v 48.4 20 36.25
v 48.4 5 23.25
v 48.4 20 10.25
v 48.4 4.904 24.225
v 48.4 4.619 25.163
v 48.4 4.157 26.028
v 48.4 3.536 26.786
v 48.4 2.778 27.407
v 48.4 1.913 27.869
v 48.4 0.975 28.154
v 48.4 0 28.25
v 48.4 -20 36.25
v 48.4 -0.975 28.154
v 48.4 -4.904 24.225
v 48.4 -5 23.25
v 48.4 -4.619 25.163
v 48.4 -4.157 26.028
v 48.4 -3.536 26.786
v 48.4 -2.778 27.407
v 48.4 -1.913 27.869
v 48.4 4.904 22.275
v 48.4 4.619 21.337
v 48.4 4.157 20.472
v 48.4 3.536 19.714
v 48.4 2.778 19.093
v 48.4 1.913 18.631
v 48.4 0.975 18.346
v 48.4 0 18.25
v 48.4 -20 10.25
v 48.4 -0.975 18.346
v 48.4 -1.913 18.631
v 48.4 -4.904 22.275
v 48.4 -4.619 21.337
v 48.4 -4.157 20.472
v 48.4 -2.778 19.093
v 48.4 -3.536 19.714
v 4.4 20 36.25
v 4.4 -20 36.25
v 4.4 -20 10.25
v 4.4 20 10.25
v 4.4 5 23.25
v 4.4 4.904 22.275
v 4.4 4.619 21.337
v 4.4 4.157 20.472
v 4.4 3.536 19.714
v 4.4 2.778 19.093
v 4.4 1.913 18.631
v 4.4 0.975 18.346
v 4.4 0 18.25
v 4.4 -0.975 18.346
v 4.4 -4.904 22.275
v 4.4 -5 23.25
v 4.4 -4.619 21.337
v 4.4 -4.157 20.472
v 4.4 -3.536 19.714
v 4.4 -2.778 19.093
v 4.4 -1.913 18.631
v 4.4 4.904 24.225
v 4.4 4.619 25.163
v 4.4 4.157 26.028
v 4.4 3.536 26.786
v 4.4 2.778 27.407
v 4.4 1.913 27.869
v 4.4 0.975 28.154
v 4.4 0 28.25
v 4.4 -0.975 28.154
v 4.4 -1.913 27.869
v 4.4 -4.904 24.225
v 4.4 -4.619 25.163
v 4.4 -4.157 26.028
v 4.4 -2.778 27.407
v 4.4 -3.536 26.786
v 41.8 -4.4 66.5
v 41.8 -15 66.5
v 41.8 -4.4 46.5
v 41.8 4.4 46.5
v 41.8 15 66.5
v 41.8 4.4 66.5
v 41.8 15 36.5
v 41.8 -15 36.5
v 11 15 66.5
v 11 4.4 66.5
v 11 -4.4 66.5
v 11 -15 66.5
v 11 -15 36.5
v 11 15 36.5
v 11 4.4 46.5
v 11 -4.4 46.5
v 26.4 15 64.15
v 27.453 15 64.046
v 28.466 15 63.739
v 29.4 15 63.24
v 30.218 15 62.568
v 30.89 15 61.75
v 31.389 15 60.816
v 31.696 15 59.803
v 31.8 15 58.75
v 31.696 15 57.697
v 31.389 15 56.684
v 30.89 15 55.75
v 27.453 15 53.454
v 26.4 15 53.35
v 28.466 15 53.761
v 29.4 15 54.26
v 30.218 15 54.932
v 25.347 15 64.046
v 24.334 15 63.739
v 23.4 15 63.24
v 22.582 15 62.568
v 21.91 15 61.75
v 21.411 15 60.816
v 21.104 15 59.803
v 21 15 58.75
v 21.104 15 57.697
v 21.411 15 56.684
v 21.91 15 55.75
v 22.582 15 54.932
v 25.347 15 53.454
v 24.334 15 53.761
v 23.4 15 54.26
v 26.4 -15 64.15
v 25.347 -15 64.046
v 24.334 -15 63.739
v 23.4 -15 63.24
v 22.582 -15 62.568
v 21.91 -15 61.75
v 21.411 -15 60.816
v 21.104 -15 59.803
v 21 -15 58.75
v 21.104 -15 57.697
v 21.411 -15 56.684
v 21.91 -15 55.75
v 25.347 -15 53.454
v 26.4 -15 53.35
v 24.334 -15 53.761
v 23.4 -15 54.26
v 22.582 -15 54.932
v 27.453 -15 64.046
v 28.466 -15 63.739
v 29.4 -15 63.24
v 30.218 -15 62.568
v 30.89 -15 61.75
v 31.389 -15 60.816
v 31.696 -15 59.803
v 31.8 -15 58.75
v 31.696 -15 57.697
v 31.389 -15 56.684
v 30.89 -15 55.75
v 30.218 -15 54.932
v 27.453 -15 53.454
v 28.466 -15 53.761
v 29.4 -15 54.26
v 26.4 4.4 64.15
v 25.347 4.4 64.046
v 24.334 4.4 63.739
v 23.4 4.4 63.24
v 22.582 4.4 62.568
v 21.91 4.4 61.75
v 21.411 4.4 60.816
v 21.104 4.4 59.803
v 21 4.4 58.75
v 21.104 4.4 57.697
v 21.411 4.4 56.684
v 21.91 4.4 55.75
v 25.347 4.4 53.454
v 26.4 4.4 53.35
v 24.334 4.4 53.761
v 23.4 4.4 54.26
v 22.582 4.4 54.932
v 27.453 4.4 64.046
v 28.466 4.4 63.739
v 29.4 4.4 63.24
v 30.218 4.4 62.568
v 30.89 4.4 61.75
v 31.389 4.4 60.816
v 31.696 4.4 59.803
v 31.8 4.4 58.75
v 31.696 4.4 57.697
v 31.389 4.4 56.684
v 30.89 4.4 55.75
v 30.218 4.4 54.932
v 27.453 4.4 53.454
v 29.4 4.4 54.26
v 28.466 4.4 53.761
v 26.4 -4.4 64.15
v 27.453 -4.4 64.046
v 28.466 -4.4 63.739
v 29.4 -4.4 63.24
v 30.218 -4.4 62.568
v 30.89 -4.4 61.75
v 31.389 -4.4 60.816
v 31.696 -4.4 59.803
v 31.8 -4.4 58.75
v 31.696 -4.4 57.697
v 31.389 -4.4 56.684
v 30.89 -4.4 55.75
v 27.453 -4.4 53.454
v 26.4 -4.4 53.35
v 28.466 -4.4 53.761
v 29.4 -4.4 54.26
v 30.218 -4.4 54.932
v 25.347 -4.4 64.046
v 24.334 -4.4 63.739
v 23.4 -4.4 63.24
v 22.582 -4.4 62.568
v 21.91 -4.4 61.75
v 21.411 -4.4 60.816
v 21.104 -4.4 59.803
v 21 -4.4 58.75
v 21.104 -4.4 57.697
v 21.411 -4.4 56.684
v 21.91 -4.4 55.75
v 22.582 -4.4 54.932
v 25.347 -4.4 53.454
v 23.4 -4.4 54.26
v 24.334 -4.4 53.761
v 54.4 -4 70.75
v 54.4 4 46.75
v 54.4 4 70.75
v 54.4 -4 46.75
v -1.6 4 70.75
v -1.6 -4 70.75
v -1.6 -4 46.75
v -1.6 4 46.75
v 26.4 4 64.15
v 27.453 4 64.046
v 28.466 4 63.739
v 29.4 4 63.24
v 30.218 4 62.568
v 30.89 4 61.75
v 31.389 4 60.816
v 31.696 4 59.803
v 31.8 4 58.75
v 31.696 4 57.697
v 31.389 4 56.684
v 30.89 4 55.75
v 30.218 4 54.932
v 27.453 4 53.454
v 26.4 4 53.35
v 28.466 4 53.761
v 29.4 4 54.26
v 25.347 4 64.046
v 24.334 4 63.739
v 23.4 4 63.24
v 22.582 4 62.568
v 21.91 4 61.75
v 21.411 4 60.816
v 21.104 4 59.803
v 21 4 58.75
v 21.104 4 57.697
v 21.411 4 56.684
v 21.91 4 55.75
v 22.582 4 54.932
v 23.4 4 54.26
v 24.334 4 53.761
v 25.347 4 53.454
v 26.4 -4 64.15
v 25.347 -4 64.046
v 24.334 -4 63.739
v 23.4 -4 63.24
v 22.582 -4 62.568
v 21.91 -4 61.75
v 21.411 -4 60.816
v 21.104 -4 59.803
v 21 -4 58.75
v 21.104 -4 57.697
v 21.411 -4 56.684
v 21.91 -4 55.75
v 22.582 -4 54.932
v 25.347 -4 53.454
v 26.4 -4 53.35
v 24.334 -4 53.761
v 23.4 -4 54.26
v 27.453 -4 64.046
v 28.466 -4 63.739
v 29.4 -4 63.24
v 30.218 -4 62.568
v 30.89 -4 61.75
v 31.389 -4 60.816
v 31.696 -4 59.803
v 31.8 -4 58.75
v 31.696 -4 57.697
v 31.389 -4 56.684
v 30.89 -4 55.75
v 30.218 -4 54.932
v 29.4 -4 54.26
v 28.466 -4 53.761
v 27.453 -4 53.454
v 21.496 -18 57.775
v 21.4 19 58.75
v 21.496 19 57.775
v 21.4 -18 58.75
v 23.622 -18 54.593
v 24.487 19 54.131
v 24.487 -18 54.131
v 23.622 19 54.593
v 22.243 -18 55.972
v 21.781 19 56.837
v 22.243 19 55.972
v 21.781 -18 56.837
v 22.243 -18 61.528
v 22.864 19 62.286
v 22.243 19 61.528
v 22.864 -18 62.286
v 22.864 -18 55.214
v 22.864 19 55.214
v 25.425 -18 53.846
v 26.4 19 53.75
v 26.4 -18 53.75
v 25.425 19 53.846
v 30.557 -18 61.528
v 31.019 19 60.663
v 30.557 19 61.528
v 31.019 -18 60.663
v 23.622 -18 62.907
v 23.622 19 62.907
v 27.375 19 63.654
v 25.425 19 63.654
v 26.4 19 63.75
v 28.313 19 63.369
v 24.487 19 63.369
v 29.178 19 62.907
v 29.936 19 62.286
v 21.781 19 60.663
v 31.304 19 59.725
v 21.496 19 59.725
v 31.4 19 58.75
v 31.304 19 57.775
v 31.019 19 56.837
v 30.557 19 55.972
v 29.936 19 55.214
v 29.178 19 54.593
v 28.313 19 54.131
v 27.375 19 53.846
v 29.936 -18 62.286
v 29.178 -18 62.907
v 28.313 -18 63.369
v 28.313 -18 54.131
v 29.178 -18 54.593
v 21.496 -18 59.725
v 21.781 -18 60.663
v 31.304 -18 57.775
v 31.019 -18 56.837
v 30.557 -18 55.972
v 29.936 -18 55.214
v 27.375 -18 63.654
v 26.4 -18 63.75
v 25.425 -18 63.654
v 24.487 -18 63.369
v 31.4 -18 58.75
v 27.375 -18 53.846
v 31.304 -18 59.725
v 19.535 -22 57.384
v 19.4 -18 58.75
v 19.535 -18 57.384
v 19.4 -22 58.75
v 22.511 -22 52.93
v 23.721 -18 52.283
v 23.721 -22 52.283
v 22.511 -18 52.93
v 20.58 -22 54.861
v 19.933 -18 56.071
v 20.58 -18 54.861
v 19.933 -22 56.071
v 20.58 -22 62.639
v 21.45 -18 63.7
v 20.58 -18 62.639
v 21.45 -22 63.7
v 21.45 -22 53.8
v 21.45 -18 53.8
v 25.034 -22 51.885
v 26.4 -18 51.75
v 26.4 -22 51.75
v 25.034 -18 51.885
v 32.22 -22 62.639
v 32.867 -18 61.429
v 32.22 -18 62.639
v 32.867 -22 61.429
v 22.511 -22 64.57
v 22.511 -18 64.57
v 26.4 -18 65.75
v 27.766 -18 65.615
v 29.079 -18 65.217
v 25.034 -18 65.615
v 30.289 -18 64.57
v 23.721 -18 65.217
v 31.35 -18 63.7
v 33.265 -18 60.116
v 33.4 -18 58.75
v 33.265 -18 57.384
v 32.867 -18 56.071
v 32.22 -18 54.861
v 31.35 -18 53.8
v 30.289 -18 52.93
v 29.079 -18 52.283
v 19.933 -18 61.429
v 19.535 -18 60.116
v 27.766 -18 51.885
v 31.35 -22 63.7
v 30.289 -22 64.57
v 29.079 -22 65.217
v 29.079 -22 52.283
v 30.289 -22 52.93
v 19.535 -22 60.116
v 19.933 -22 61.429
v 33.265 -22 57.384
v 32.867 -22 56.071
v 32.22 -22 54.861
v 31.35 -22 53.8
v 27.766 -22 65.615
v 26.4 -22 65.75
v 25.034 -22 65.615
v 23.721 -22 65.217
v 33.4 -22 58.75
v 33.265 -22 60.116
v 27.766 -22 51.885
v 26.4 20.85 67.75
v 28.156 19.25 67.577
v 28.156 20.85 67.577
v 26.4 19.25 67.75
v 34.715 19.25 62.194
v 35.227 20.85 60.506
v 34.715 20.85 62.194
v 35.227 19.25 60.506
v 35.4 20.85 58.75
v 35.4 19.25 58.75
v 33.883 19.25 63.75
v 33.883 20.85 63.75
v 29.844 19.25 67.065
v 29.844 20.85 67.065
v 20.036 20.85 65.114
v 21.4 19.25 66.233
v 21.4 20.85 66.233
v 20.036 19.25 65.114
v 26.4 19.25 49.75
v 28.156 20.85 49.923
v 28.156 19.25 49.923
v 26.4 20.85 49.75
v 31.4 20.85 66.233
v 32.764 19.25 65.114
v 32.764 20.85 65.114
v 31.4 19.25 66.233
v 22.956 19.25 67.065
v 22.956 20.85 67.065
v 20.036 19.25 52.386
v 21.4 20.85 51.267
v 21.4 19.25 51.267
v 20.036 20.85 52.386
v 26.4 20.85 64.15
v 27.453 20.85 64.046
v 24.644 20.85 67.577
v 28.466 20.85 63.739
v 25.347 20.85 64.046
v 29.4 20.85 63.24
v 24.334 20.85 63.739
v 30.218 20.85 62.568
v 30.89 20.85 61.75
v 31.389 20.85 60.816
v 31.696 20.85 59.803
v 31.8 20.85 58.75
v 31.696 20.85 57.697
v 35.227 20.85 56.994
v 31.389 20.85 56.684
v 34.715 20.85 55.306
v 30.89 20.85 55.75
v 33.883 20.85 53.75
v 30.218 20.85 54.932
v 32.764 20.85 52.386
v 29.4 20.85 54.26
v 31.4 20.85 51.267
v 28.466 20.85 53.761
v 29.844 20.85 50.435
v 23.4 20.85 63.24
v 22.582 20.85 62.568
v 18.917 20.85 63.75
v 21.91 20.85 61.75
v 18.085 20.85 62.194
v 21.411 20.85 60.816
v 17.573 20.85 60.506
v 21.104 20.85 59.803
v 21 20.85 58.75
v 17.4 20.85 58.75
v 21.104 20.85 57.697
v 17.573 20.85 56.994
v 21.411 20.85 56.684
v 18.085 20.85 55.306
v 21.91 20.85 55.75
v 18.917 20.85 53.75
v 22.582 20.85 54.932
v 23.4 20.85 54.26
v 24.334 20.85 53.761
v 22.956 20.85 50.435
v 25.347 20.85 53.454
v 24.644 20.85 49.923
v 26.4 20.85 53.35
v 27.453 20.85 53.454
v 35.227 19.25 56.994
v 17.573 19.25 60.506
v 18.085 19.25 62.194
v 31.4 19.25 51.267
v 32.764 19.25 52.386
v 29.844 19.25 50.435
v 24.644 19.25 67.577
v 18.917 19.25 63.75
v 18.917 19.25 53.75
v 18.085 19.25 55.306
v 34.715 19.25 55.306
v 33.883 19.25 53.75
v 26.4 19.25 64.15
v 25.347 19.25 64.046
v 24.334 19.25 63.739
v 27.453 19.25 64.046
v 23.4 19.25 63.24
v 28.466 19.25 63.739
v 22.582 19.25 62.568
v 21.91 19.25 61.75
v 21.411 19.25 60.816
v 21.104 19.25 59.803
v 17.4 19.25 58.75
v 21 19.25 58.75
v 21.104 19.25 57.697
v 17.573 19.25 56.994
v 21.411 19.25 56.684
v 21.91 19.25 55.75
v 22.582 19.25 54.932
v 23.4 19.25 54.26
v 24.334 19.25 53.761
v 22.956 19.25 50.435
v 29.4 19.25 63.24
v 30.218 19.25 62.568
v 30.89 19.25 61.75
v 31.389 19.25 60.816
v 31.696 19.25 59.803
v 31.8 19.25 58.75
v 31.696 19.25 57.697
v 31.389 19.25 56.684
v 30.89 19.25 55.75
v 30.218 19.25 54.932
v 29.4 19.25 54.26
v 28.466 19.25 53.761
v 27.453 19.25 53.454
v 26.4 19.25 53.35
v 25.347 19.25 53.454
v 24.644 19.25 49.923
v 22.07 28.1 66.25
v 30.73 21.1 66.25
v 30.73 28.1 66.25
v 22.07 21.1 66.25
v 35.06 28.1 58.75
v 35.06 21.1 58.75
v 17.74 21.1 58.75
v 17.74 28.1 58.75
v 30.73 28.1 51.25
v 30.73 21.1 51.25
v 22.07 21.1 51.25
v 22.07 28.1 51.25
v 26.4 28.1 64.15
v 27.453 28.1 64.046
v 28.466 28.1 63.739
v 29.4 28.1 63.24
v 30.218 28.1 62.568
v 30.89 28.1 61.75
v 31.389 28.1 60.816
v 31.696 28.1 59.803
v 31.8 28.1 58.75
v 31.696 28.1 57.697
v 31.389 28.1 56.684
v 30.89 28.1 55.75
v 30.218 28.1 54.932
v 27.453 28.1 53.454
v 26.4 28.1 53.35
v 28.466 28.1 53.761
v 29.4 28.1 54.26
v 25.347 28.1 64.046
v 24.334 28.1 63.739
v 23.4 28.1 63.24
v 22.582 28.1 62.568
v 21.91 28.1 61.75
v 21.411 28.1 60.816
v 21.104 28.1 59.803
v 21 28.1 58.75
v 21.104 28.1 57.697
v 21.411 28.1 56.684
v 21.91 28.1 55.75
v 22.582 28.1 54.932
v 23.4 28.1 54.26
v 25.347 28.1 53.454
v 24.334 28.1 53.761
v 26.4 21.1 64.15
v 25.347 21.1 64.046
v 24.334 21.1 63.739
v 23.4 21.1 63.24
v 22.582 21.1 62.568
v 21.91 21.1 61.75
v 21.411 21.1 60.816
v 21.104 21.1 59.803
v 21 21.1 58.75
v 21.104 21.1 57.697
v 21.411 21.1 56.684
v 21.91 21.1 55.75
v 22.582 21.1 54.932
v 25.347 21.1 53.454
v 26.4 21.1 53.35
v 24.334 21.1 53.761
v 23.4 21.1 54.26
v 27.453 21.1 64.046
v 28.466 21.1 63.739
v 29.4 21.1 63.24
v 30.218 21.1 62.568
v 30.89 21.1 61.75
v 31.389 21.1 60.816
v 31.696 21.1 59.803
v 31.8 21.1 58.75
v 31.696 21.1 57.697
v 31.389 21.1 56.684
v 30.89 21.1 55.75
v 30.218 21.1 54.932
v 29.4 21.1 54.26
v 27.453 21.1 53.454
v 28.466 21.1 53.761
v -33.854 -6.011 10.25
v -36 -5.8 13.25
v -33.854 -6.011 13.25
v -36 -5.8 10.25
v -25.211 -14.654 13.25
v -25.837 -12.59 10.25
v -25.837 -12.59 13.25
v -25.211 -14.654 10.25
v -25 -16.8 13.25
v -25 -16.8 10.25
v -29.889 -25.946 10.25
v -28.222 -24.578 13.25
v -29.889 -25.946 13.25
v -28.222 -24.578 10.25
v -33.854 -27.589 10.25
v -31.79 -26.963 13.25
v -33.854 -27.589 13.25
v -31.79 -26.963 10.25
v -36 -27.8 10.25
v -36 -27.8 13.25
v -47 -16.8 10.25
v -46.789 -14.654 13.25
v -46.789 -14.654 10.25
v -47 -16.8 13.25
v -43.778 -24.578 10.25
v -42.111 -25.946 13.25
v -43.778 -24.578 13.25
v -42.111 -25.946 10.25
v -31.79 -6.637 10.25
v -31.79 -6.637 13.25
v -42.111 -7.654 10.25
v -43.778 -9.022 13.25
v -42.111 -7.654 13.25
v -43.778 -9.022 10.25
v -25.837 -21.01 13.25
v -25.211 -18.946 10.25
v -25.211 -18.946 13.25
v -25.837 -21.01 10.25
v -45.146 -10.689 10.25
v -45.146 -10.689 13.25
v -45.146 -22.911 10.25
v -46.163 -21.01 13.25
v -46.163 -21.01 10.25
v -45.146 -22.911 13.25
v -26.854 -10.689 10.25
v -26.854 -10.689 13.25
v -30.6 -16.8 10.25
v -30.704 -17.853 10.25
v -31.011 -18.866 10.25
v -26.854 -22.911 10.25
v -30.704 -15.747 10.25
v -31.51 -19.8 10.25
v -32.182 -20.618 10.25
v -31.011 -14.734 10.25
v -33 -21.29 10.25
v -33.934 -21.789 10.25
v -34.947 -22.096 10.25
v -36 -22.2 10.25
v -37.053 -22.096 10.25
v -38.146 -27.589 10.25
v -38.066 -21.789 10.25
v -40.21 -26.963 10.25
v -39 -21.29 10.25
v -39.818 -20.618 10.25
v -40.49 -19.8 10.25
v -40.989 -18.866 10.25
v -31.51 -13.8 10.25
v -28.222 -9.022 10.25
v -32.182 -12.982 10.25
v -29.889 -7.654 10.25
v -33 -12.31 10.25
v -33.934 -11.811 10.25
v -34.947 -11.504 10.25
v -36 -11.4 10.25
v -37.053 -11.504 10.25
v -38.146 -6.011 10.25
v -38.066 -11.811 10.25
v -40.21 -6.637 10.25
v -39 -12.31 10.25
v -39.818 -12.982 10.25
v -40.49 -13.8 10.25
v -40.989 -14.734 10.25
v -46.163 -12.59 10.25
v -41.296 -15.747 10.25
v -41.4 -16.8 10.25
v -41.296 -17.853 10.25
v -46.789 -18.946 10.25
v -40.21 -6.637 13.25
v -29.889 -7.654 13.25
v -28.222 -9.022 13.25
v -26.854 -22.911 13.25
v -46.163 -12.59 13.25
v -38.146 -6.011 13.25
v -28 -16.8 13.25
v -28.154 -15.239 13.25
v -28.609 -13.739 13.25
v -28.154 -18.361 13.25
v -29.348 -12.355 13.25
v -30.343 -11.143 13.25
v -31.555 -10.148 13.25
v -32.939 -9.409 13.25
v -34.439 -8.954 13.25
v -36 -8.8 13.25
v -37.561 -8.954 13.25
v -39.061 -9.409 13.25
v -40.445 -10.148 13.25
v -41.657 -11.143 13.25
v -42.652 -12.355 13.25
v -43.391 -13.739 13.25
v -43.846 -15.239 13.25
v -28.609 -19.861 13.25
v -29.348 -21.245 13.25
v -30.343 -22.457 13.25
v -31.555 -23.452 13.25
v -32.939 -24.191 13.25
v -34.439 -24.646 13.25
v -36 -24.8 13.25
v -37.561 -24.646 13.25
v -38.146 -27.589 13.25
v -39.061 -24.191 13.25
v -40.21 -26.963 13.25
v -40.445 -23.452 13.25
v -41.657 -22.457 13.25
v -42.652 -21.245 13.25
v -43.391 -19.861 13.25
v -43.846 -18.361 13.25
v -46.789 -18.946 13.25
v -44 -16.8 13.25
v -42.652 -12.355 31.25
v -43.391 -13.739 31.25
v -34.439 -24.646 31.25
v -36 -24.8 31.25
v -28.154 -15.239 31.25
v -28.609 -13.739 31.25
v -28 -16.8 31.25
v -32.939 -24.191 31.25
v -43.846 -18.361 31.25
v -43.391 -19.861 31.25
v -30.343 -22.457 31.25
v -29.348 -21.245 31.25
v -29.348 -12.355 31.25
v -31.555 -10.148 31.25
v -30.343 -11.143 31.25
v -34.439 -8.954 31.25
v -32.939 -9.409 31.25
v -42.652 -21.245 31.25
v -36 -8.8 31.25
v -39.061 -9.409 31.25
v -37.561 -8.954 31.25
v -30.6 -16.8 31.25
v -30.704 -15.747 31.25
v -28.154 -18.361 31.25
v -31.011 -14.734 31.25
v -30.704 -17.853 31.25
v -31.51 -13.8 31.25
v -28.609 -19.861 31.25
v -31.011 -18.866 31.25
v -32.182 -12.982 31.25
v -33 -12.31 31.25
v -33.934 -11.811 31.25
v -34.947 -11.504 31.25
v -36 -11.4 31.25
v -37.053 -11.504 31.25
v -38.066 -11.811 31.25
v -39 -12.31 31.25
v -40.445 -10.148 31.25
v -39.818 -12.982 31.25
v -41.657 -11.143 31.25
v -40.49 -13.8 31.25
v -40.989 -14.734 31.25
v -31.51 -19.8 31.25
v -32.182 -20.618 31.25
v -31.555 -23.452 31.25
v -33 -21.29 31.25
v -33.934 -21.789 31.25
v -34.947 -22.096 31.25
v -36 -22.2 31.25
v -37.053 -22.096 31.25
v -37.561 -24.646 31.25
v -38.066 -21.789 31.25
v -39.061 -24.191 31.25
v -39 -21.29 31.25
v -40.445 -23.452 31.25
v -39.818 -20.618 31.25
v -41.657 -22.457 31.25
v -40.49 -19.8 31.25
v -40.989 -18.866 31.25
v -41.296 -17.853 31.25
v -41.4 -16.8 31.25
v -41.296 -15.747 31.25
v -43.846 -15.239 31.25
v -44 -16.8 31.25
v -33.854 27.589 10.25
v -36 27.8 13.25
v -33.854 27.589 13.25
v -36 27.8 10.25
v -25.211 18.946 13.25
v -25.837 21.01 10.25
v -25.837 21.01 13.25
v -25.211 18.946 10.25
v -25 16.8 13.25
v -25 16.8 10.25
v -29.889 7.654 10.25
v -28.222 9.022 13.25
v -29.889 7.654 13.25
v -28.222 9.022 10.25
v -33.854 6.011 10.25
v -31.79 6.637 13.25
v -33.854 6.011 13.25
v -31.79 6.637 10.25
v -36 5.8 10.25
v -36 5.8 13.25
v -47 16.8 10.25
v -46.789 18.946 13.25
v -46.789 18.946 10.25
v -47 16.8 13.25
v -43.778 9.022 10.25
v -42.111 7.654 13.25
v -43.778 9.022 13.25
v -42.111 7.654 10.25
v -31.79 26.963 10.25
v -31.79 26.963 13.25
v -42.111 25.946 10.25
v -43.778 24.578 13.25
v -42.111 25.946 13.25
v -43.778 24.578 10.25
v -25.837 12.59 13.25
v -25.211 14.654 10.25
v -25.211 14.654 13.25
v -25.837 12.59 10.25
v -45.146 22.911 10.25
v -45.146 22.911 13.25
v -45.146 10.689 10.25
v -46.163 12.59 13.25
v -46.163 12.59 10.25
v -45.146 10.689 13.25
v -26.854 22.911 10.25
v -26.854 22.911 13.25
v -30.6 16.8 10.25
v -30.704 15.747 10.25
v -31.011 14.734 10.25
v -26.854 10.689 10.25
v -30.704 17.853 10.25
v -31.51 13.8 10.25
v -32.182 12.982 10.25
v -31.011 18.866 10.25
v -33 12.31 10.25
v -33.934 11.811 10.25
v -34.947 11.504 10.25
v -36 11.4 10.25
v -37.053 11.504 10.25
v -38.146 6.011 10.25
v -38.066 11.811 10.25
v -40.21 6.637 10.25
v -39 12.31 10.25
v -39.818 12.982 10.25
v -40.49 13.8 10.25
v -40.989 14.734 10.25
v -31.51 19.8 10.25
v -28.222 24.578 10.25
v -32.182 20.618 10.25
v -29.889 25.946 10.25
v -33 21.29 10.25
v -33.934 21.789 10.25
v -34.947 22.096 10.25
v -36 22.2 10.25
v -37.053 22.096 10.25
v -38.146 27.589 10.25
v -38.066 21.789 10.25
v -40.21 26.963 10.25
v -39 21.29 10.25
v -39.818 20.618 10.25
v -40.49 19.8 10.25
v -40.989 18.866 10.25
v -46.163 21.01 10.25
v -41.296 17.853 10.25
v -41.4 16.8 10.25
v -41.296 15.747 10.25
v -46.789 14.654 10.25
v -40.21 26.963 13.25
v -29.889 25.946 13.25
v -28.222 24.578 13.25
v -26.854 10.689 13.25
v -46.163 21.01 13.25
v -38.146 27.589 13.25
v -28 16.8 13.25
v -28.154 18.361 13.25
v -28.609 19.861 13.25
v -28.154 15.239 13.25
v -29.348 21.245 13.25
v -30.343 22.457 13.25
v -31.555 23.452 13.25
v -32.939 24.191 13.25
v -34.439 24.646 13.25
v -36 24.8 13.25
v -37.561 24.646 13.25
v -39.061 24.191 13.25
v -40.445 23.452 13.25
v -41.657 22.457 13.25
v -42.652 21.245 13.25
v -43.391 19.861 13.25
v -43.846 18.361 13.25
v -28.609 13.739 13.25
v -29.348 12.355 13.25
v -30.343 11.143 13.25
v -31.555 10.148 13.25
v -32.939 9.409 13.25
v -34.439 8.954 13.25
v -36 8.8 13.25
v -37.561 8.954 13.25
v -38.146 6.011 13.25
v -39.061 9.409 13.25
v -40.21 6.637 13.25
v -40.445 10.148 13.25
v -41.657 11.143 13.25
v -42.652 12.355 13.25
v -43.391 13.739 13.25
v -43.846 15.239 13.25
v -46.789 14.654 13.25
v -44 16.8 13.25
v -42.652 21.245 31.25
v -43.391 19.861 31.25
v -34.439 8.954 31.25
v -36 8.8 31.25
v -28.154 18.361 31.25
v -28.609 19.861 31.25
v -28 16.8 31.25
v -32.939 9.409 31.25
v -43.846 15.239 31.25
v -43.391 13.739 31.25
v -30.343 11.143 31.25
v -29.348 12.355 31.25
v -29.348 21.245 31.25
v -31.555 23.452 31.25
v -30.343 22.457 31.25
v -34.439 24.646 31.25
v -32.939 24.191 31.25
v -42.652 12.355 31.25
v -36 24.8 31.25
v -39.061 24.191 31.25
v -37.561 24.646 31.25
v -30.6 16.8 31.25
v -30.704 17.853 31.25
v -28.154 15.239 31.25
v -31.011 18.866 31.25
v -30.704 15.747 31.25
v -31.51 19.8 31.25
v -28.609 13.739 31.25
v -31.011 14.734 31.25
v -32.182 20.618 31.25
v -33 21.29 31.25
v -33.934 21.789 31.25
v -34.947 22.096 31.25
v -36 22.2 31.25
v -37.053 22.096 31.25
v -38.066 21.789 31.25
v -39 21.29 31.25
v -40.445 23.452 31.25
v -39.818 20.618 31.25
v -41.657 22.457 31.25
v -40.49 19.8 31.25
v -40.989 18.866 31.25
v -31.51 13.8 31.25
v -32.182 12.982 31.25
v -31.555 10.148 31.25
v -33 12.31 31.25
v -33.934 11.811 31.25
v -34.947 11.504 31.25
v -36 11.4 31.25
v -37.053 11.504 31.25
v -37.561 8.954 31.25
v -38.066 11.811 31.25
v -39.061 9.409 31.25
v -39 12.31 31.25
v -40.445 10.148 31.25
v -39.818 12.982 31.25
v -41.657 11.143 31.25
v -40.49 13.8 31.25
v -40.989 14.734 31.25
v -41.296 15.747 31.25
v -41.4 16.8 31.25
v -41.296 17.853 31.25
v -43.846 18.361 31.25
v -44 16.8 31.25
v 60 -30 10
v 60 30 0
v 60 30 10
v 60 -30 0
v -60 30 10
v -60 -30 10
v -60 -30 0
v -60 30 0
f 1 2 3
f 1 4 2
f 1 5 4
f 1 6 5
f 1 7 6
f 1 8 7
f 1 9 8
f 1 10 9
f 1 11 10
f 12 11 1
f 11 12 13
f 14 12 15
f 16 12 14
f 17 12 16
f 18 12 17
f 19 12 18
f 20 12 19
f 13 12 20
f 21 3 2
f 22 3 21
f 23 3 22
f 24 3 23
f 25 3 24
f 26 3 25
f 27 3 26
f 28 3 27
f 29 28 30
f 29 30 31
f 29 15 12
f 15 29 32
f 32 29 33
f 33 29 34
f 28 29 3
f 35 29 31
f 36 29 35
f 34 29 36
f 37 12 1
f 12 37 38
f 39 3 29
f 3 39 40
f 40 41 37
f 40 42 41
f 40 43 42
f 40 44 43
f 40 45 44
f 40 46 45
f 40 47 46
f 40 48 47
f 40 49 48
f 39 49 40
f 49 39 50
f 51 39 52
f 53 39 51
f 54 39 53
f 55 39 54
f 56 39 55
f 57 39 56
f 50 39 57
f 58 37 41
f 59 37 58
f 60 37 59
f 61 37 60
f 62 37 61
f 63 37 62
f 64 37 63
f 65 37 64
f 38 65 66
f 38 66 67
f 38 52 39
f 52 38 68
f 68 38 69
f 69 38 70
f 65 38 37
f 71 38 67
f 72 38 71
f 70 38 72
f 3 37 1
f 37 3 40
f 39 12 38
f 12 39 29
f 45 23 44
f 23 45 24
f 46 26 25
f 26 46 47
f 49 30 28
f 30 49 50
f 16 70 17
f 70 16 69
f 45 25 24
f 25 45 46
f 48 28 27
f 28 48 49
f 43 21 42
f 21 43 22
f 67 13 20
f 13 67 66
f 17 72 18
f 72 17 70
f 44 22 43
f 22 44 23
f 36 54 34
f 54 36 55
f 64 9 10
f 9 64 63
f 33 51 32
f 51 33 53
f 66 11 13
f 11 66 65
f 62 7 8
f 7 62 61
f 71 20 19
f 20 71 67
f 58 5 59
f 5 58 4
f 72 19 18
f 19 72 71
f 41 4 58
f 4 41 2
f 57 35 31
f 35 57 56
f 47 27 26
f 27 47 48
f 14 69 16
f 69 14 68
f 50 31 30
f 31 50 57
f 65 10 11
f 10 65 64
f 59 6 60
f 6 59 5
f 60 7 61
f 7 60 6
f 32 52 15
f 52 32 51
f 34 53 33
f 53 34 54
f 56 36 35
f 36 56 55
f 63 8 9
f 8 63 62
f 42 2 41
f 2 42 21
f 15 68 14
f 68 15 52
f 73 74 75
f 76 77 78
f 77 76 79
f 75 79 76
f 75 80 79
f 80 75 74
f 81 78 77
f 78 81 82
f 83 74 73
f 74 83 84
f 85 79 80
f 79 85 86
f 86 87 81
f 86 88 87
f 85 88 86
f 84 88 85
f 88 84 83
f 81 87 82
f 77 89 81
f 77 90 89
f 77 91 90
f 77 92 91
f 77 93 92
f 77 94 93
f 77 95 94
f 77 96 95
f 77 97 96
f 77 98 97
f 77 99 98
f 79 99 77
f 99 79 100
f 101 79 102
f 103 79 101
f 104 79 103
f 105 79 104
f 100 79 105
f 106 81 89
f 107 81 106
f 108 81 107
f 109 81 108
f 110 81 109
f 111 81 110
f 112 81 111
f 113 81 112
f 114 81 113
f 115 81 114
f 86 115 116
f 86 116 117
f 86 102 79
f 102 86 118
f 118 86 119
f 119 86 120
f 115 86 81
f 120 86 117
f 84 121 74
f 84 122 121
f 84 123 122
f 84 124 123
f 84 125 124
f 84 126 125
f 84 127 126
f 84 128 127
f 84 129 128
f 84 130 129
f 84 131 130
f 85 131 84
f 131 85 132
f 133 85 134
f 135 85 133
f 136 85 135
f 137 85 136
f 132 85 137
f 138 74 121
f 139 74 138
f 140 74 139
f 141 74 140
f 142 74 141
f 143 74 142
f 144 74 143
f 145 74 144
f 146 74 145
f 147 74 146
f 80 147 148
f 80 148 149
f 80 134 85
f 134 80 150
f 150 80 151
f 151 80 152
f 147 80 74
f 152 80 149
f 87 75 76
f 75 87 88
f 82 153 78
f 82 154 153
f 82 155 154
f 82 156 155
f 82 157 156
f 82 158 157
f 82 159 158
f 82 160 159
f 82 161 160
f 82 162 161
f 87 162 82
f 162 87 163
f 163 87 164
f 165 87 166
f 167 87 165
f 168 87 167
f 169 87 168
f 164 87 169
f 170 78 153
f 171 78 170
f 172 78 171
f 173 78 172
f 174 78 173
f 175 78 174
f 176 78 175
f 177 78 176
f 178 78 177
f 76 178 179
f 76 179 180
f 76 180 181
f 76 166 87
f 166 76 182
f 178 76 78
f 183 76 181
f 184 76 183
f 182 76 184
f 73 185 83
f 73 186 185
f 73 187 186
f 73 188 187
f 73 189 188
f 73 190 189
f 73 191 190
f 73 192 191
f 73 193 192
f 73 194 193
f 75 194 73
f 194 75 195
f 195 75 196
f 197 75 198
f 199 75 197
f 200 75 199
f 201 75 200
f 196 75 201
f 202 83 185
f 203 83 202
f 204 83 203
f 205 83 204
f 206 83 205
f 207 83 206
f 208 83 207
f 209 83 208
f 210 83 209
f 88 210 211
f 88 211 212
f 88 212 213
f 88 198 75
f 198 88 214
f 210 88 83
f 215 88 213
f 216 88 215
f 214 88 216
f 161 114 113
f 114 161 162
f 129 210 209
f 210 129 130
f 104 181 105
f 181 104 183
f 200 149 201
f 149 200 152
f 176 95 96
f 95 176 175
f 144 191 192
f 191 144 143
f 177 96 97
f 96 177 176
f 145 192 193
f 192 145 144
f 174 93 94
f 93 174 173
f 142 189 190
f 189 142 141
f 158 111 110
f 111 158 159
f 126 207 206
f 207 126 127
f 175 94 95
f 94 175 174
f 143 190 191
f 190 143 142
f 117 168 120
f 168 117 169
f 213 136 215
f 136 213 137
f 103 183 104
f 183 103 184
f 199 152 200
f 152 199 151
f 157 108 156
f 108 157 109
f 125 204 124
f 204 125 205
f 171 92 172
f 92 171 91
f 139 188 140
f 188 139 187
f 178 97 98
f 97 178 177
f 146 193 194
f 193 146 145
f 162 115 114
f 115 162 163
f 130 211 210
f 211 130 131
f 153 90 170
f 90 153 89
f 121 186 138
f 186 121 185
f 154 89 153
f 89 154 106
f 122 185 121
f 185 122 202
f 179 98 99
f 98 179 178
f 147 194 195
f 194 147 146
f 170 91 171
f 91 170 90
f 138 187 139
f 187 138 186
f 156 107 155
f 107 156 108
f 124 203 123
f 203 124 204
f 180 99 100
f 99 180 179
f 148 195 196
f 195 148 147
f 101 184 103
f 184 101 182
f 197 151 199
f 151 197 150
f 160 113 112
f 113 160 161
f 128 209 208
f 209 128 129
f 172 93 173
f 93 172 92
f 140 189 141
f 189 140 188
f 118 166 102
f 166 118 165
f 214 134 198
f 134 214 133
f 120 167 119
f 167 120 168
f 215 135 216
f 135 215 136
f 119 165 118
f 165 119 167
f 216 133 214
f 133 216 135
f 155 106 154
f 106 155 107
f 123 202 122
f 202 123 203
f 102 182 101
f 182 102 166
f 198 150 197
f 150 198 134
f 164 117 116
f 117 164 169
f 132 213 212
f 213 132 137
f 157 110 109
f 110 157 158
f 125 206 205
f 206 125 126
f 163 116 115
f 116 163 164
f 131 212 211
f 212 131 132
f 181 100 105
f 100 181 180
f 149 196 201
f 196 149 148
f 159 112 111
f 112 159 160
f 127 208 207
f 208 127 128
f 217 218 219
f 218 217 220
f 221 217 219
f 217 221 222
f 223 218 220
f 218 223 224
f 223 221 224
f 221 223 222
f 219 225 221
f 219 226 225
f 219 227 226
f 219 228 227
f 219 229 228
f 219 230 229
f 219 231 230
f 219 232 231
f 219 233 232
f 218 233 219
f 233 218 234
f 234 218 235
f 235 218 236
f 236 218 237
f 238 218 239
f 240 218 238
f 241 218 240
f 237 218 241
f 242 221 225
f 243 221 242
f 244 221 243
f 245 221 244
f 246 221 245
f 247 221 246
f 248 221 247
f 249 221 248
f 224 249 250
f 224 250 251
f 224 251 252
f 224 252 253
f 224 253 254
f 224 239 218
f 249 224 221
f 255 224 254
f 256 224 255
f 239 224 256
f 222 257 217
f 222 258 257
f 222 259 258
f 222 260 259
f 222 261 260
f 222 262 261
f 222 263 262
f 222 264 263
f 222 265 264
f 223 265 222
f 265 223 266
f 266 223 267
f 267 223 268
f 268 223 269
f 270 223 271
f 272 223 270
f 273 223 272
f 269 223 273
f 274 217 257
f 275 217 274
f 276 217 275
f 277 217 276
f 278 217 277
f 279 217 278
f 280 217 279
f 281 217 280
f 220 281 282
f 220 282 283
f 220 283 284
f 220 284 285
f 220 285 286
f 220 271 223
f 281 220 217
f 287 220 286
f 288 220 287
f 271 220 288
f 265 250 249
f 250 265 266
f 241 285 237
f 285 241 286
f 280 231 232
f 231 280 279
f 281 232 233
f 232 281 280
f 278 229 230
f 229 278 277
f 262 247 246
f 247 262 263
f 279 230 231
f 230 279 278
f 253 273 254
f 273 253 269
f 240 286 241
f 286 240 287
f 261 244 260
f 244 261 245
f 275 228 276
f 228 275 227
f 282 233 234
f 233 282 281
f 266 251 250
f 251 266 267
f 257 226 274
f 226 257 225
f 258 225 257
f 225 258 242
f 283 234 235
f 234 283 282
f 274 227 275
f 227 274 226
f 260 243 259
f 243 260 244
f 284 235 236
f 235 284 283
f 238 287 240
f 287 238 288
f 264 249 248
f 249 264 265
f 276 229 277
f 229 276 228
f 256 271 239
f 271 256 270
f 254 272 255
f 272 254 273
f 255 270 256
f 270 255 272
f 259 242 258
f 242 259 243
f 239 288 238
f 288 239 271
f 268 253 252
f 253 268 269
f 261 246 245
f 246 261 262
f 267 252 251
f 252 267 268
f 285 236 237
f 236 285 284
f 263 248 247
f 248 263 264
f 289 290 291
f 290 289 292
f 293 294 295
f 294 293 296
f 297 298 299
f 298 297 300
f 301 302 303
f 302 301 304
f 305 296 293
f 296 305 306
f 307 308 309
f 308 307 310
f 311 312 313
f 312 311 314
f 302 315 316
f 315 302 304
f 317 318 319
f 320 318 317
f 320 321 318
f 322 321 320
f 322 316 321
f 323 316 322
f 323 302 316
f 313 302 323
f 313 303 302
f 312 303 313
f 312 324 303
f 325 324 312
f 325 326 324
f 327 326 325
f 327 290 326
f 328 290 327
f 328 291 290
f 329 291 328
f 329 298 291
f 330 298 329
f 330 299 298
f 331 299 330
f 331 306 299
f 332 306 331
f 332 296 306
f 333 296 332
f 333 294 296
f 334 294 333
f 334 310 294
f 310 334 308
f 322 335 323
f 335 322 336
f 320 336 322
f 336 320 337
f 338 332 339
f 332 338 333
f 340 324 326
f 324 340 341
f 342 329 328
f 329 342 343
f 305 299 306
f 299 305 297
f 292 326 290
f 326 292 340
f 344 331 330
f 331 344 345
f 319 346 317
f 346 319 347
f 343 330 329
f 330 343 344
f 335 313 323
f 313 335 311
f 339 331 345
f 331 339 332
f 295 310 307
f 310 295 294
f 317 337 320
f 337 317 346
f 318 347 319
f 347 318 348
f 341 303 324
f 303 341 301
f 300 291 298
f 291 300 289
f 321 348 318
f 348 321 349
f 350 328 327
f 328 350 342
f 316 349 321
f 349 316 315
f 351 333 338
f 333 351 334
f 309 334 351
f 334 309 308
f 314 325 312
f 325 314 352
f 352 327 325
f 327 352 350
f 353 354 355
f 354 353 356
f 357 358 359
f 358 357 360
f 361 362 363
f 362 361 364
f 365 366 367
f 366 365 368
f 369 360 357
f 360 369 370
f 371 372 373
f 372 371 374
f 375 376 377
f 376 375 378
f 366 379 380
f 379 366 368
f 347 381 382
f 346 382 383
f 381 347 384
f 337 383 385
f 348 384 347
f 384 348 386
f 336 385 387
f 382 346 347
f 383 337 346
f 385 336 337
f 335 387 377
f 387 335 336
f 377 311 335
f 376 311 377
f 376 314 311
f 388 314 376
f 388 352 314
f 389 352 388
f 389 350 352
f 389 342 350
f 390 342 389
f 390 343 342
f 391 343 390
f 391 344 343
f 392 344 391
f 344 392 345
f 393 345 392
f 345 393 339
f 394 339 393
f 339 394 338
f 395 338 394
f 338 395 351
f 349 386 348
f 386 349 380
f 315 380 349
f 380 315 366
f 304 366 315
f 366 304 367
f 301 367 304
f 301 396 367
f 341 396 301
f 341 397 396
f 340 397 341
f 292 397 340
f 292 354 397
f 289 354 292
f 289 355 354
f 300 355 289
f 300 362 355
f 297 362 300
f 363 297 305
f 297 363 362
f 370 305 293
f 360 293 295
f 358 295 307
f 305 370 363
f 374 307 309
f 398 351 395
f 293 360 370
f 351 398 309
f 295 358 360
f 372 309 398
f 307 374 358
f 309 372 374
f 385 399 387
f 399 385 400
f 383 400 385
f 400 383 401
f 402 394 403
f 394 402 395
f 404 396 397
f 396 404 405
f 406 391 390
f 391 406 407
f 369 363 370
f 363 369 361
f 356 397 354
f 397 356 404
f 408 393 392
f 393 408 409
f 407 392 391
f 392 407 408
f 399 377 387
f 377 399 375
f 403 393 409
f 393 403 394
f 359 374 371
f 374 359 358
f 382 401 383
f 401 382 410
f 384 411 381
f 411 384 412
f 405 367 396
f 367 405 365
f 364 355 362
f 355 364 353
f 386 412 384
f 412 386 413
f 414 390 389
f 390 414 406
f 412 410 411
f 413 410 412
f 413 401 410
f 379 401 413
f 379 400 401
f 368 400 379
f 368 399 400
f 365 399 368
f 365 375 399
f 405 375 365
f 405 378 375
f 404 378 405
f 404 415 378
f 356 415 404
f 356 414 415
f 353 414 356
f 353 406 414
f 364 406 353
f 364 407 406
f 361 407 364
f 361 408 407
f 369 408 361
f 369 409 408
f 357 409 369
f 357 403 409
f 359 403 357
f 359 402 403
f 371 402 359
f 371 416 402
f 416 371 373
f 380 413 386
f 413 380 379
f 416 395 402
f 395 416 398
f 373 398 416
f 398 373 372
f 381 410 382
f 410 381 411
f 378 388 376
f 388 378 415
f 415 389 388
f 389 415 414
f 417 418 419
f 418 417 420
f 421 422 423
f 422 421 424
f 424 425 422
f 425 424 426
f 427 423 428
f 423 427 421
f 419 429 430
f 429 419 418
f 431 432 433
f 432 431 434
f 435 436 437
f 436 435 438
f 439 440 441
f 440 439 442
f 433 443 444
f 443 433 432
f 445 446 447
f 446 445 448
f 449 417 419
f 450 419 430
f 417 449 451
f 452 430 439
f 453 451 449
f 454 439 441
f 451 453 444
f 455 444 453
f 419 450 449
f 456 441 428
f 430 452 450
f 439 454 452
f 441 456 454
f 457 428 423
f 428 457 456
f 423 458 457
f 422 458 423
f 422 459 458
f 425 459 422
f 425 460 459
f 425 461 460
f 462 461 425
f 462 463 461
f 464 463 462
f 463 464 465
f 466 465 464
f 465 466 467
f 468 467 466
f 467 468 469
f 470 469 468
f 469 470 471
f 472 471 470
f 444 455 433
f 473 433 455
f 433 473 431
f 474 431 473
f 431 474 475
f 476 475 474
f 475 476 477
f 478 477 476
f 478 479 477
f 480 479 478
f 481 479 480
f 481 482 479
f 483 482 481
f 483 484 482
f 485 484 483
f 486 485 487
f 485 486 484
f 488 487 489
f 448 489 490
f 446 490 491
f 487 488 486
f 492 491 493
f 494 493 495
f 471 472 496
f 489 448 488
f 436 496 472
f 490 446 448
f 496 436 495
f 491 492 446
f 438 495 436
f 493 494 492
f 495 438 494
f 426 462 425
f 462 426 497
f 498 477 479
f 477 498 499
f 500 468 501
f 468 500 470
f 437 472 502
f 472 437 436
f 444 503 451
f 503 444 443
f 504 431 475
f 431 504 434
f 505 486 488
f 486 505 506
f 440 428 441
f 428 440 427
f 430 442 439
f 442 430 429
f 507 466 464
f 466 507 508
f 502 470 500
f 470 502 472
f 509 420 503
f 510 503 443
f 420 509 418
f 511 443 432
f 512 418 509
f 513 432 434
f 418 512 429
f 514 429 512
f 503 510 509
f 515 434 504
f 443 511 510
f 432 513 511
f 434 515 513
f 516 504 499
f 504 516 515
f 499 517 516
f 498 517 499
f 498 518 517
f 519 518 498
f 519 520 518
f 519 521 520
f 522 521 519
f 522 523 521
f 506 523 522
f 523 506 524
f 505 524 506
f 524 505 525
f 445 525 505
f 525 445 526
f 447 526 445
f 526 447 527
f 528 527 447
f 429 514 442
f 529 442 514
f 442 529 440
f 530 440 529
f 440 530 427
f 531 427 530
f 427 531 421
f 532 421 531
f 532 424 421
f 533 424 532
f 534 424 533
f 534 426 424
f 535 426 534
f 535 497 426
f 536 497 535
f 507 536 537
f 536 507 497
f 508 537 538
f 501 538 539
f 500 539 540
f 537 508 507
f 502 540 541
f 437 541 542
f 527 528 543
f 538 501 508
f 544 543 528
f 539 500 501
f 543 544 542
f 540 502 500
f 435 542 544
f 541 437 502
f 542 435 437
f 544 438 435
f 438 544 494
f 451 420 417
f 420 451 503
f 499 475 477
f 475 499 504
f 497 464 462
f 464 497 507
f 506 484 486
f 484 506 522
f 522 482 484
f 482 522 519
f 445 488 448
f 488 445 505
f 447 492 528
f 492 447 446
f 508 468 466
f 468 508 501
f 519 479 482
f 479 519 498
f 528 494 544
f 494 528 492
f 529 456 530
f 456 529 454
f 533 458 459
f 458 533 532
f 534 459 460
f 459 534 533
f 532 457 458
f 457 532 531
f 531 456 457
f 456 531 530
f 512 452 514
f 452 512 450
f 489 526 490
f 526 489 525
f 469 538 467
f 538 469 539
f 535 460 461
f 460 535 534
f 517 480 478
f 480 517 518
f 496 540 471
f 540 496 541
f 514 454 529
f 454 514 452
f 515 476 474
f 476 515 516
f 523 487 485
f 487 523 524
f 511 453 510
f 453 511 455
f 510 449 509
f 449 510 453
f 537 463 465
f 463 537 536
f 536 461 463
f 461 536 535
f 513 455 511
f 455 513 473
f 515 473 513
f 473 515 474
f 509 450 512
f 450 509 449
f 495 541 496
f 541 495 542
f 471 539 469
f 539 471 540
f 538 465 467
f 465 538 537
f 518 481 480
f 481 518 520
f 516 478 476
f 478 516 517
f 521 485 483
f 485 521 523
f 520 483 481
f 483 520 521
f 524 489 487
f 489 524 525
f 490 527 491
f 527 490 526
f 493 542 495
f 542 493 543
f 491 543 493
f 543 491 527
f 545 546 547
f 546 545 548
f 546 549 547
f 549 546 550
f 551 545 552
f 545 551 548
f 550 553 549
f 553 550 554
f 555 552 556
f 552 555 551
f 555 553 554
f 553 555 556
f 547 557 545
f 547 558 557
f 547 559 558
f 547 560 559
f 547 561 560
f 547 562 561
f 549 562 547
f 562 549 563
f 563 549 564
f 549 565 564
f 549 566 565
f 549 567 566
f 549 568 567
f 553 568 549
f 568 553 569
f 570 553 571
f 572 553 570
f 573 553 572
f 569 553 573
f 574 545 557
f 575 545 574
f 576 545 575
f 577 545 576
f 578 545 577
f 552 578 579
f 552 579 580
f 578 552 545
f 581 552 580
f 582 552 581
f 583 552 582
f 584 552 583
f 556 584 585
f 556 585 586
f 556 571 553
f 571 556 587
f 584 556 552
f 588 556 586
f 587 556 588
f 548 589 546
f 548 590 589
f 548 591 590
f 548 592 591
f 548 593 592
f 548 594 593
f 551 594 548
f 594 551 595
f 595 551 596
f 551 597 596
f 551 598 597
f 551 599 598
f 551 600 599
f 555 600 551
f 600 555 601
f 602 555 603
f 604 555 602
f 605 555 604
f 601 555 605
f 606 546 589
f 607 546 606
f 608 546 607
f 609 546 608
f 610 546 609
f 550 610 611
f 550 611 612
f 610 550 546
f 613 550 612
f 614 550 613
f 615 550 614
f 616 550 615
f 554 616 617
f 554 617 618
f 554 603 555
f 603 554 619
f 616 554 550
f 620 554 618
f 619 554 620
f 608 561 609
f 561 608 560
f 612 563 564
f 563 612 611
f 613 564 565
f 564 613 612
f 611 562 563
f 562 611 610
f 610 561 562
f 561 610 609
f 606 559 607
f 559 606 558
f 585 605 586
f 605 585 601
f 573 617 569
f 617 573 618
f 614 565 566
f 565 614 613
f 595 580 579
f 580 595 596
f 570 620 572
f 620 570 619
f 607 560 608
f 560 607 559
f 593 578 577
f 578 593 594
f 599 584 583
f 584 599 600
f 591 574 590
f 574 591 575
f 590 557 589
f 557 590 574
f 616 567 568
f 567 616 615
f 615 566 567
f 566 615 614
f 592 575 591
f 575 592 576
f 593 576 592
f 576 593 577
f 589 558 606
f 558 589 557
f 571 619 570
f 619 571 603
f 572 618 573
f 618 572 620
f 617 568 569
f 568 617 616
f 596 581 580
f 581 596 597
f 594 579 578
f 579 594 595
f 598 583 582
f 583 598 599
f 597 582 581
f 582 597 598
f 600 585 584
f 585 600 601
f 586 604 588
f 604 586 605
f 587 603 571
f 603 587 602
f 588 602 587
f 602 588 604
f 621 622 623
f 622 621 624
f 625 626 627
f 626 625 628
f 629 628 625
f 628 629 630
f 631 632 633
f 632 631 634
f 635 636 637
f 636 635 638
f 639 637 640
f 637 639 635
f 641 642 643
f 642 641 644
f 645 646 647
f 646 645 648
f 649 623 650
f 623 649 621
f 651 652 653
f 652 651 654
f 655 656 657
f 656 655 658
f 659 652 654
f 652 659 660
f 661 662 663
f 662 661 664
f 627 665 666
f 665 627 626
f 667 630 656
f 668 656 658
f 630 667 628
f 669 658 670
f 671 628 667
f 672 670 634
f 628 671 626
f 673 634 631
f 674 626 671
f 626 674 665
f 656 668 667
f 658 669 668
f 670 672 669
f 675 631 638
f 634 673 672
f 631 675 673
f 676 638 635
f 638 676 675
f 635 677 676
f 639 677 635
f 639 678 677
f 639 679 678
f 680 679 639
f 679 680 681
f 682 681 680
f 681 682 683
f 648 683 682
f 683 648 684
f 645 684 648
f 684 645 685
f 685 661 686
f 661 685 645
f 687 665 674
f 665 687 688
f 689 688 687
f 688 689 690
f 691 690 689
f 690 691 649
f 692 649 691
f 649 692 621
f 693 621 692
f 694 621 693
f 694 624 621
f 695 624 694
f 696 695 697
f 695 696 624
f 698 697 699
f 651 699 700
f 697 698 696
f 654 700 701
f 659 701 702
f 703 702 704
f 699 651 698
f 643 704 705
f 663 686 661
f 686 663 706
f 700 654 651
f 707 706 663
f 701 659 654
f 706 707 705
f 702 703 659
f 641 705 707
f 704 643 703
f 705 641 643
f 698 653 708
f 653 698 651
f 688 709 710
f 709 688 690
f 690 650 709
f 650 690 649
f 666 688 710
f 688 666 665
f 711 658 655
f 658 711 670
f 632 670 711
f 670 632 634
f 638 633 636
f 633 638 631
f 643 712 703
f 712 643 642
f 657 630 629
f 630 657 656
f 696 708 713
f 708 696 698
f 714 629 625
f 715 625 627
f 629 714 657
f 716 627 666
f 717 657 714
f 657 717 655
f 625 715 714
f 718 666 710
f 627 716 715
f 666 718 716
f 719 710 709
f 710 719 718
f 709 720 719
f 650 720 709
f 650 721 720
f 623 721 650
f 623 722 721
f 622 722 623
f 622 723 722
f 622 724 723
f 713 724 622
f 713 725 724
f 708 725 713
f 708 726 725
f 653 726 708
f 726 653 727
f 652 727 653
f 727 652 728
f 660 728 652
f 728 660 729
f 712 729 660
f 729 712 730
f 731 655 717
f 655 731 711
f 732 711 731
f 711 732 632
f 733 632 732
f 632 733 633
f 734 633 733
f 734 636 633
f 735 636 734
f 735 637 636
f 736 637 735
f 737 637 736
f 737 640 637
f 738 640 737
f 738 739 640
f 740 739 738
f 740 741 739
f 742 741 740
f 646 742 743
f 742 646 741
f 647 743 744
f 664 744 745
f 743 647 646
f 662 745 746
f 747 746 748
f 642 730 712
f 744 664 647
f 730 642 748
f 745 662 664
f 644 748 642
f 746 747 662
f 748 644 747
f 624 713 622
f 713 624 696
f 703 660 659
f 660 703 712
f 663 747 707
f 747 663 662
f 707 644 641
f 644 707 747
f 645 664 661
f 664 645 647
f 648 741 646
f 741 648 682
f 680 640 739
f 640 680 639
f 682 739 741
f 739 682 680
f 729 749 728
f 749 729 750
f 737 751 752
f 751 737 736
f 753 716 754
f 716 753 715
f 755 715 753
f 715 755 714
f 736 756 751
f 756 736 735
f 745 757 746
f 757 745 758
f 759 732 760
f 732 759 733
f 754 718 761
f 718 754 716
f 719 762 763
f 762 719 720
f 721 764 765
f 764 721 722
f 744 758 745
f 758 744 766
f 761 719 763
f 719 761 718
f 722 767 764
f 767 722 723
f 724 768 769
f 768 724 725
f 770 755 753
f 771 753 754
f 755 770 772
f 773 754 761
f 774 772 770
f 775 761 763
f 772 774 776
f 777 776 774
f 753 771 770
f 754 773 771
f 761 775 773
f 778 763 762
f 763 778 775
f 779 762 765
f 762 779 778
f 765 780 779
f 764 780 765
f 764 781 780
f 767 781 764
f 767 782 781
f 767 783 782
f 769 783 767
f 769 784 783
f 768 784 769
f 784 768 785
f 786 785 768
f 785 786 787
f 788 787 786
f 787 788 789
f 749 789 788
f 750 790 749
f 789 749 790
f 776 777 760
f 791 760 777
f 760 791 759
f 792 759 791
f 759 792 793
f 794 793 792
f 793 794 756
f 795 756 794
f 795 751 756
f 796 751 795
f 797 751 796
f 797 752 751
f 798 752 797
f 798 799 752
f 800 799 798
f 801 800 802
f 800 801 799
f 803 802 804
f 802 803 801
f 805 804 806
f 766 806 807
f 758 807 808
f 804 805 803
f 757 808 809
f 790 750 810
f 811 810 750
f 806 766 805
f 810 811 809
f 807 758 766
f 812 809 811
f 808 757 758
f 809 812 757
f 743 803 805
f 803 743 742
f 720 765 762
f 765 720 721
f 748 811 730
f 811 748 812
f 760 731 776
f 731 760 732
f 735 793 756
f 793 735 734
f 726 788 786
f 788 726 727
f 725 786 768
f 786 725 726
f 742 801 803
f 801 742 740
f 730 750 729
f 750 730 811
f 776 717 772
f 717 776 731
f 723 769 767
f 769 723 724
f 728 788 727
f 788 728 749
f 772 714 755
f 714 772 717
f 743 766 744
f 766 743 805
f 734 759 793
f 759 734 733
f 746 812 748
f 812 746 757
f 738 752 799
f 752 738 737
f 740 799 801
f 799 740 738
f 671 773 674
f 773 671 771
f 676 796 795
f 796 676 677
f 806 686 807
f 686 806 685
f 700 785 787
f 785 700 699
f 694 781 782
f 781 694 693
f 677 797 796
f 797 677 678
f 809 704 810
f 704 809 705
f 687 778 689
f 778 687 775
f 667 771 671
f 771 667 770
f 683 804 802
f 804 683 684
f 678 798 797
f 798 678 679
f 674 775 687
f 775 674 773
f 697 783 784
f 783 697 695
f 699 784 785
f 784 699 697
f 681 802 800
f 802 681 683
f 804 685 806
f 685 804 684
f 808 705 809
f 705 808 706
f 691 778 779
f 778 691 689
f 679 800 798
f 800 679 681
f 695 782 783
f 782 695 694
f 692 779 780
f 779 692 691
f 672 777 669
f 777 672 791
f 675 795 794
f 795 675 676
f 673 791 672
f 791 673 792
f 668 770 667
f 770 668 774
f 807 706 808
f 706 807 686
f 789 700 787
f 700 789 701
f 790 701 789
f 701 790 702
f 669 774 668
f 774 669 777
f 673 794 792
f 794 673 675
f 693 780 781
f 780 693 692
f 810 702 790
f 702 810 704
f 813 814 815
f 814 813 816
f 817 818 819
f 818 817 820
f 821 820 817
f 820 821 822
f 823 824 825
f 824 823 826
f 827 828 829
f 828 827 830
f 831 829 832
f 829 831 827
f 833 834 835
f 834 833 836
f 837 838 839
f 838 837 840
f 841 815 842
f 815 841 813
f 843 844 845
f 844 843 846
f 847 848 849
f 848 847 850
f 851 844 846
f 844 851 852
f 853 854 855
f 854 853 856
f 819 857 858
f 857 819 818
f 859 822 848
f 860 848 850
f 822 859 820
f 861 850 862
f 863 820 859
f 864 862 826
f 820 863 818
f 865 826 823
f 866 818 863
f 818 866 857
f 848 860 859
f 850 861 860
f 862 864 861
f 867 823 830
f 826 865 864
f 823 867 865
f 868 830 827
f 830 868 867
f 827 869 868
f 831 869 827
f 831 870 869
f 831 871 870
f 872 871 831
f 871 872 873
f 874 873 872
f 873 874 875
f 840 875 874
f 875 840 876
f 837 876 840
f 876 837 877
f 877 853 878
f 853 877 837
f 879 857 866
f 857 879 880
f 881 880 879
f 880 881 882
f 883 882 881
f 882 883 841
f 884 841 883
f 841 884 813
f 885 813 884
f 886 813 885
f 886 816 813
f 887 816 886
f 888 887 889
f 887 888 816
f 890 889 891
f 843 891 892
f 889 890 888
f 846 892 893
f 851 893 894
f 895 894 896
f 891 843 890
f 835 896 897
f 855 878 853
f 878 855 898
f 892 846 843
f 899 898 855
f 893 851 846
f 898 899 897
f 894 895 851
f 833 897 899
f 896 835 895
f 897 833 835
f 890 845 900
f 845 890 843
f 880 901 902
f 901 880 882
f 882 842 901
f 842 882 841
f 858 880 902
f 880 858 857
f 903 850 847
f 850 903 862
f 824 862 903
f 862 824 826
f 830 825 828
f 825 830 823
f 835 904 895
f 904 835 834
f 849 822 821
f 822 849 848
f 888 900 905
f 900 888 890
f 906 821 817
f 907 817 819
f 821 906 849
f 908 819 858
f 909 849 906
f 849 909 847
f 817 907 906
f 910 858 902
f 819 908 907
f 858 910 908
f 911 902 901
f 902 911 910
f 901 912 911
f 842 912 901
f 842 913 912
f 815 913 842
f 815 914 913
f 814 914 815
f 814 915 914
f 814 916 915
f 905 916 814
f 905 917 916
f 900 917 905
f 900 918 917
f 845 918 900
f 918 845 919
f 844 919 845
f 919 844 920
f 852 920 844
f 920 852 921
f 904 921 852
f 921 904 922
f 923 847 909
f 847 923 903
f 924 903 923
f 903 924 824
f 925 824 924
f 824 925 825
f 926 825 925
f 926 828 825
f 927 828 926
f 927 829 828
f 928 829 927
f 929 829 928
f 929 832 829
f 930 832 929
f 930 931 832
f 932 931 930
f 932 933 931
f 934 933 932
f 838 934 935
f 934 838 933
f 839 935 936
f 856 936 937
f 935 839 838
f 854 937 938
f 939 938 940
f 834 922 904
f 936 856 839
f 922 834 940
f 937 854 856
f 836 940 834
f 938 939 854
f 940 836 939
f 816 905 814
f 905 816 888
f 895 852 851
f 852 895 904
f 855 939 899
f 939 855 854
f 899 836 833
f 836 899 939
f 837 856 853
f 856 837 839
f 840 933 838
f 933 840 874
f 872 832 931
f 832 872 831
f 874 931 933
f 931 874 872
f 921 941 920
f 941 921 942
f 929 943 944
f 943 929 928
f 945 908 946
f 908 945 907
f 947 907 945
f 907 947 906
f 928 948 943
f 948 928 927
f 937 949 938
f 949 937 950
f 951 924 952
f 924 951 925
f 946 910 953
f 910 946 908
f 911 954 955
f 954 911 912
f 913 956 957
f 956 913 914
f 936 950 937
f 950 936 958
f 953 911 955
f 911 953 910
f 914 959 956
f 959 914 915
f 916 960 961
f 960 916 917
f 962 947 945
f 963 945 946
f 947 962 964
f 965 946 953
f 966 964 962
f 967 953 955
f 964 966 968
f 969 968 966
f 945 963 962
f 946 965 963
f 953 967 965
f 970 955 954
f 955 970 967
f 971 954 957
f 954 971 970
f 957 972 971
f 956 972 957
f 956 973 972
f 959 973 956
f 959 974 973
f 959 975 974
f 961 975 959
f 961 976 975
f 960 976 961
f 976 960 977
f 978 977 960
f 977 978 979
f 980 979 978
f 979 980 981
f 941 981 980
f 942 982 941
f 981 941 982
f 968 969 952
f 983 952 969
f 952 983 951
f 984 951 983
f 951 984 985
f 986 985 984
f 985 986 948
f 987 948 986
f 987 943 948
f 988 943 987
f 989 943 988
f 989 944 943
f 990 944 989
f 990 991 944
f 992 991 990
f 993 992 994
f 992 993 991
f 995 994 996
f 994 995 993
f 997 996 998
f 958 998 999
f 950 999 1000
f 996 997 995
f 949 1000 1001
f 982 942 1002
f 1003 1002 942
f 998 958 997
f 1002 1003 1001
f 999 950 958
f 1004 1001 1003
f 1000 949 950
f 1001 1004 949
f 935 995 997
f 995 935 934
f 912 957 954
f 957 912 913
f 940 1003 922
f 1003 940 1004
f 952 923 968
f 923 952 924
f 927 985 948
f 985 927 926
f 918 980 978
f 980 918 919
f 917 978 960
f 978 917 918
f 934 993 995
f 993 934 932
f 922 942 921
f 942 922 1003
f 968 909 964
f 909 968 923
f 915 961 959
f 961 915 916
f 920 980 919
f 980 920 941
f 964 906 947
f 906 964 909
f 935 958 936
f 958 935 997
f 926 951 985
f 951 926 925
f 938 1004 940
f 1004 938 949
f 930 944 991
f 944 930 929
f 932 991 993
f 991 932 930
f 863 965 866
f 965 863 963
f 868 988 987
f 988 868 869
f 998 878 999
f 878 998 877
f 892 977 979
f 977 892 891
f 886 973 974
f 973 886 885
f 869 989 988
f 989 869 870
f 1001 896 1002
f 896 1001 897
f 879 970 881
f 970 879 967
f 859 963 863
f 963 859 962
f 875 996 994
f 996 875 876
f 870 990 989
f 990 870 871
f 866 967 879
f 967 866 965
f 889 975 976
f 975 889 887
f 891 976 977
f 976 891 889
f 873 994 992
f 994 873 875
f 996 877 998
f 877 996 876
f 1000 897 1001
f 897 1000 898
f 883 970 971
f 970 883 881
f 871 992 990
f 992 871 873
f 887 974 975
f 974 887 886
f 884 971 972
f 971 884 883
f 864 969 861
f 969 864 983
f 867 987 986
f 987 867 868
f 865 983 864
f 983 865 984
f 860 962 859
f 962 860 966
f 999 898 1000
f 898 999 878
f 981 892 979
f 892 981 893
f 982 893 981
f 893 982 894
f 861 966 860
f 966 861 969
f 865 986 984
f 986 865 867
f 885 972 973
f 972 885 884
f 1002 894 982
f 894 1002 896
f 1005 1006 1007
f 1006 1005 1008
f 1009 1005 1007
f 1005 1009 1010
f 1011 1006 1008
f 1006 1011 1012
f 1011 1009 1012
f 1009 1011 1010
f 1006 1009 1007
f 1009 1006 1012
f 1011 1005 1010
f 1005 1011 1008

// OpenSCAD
$fn = 32;

// ------------------------------------------------------------------------
// Indexing jig: plate 120 x 60 mm, pin d10
// Every part is its own module, assembly() places every instance.
// ------------------------------------------------------------------------

// --- part 1 ---
module jig_plate() {
  difference() {
    translate([-60, -30, 0]) cube([120, 60, 10]);
  }
}

// --- part 2 ---
module locator_block() {
  difference() {
    translate([-22, -20, 0]) cube([44, 40, 26]);
    translate([0, 0, 13]) rotate([0, 90, 0]) cylinder(h = 46, d = 10, center = true);
  }
}

// --- part 3 ---
module index_fork() {
  difference() {
    translate([-15.4, -15, 0]) cube([30.8, 30, 30]);
    translate([-16.4, -4.4, 10]) cube([32.8, 8.8, 21]);
    translate([0, 0, 22.25]) rotate([90, 0, 0]) cylinder(h = 32, d = 10.8, center = true);
  }
}

// --- part 4 ---
module index_arm() {
  difference() {
    translate([-28, -4, 0]) cube([56, 8, 24]);
    translate([0, 0, 12]) rotate([90, 0, 0]) cylinder(h = 10, d = 10.8, center = true);
  }
}

// --- part 5 ---
module index_pin() {
  rotate([0, 90, 0]) cylinder(h = 38, d = 10, center = true);
  translate([-22, 0, 0]) rotate([0, 90, 0]) cylinder(h = 4, d = 14);
}

// --- part 6 ---
module pin_washer() {
  difference() {
      translate([0, 0, 0]) cylinder(h = 1.6, d = 18);
      translate([0, 0, -1]) cylinder(h = 3.6, d = 10.8);
    }
}

// --- part 7 ---
module lock_nut() {
  difference() {
    linear_extrude(height = 7) polygon(points = [[8.66, 0], [4.33, 7.5], [-4.33, 7.5], [-8.66, 0], [-4.33, -7.5], [4.33, -7.5]]);
    translate([0, 0, -1]) cylinder(h = 9, d = 10.8);
  }
}

// --- part 8 ---
module guide_bush_a() {
  difference() {
    union() {
      cylinder(h = 3, d = 22);
      translate([0, 0, 3]) cylinder(h = 18, d = 16);
    }
    translate([0, 0, -1]) cylinder(h = 23, d = 10.8);
  }
}

// --- part 9 ---
module guide_bush_b() {
  difference() {
    union() {
      cylinder(h = 3, d = 22);
      translate([0, 0, 3]) cylinder(h = 18, d = 16);
    }
    translate([0, 0, -1]) cylinder(h = 23, d = 10.8);
  }
}

// --- assembly ---
module assembly() {
  color([0.80, 0.24, 0.20]) translate([0, 0, 0]) rotate([0, 0, 0]) jig_plate();
  color([0.20, 0.45, 0.75]) translate([26.4, 0, 10.25]) rotate([0, 0, 0]) locator_block();
  color([0.25, 0.62, 0.32]) translate([26.4, 0, 36.5]) rotate([0, 0, 0]) index_fork();
  color([0.92, 0.70, 0.18]) translate([26.4, 0, 46.75]) rotate([0, 0, 0]) index_arm();
  color([0.58, 0.35, 0.70]) translate([26.4, 0, 58.75]) rotate([0, 0, 90]) index_pin();
  color([0.16, 0.66, 0.66]) translate([26.4, 20.85, 58.75]) rotate([90, 0, 0]) pin_washer();
  color([0.85, 0.48, 0.18]) translate([26.4, 28.1, 58.75]) rotate([90, 0, 0]) lock_nut();
  color([0.55, 0.60, 0.65]) translate([-36, -16.8, 10.25]) rotate([0, 0, 0]) guide_bush_a();
  color([0.75, 0.30, 0.55]) translate([-36, 16.8, 10.25]) rotate([0, 0, 0]) guide_bush_b();
}

assembly();
